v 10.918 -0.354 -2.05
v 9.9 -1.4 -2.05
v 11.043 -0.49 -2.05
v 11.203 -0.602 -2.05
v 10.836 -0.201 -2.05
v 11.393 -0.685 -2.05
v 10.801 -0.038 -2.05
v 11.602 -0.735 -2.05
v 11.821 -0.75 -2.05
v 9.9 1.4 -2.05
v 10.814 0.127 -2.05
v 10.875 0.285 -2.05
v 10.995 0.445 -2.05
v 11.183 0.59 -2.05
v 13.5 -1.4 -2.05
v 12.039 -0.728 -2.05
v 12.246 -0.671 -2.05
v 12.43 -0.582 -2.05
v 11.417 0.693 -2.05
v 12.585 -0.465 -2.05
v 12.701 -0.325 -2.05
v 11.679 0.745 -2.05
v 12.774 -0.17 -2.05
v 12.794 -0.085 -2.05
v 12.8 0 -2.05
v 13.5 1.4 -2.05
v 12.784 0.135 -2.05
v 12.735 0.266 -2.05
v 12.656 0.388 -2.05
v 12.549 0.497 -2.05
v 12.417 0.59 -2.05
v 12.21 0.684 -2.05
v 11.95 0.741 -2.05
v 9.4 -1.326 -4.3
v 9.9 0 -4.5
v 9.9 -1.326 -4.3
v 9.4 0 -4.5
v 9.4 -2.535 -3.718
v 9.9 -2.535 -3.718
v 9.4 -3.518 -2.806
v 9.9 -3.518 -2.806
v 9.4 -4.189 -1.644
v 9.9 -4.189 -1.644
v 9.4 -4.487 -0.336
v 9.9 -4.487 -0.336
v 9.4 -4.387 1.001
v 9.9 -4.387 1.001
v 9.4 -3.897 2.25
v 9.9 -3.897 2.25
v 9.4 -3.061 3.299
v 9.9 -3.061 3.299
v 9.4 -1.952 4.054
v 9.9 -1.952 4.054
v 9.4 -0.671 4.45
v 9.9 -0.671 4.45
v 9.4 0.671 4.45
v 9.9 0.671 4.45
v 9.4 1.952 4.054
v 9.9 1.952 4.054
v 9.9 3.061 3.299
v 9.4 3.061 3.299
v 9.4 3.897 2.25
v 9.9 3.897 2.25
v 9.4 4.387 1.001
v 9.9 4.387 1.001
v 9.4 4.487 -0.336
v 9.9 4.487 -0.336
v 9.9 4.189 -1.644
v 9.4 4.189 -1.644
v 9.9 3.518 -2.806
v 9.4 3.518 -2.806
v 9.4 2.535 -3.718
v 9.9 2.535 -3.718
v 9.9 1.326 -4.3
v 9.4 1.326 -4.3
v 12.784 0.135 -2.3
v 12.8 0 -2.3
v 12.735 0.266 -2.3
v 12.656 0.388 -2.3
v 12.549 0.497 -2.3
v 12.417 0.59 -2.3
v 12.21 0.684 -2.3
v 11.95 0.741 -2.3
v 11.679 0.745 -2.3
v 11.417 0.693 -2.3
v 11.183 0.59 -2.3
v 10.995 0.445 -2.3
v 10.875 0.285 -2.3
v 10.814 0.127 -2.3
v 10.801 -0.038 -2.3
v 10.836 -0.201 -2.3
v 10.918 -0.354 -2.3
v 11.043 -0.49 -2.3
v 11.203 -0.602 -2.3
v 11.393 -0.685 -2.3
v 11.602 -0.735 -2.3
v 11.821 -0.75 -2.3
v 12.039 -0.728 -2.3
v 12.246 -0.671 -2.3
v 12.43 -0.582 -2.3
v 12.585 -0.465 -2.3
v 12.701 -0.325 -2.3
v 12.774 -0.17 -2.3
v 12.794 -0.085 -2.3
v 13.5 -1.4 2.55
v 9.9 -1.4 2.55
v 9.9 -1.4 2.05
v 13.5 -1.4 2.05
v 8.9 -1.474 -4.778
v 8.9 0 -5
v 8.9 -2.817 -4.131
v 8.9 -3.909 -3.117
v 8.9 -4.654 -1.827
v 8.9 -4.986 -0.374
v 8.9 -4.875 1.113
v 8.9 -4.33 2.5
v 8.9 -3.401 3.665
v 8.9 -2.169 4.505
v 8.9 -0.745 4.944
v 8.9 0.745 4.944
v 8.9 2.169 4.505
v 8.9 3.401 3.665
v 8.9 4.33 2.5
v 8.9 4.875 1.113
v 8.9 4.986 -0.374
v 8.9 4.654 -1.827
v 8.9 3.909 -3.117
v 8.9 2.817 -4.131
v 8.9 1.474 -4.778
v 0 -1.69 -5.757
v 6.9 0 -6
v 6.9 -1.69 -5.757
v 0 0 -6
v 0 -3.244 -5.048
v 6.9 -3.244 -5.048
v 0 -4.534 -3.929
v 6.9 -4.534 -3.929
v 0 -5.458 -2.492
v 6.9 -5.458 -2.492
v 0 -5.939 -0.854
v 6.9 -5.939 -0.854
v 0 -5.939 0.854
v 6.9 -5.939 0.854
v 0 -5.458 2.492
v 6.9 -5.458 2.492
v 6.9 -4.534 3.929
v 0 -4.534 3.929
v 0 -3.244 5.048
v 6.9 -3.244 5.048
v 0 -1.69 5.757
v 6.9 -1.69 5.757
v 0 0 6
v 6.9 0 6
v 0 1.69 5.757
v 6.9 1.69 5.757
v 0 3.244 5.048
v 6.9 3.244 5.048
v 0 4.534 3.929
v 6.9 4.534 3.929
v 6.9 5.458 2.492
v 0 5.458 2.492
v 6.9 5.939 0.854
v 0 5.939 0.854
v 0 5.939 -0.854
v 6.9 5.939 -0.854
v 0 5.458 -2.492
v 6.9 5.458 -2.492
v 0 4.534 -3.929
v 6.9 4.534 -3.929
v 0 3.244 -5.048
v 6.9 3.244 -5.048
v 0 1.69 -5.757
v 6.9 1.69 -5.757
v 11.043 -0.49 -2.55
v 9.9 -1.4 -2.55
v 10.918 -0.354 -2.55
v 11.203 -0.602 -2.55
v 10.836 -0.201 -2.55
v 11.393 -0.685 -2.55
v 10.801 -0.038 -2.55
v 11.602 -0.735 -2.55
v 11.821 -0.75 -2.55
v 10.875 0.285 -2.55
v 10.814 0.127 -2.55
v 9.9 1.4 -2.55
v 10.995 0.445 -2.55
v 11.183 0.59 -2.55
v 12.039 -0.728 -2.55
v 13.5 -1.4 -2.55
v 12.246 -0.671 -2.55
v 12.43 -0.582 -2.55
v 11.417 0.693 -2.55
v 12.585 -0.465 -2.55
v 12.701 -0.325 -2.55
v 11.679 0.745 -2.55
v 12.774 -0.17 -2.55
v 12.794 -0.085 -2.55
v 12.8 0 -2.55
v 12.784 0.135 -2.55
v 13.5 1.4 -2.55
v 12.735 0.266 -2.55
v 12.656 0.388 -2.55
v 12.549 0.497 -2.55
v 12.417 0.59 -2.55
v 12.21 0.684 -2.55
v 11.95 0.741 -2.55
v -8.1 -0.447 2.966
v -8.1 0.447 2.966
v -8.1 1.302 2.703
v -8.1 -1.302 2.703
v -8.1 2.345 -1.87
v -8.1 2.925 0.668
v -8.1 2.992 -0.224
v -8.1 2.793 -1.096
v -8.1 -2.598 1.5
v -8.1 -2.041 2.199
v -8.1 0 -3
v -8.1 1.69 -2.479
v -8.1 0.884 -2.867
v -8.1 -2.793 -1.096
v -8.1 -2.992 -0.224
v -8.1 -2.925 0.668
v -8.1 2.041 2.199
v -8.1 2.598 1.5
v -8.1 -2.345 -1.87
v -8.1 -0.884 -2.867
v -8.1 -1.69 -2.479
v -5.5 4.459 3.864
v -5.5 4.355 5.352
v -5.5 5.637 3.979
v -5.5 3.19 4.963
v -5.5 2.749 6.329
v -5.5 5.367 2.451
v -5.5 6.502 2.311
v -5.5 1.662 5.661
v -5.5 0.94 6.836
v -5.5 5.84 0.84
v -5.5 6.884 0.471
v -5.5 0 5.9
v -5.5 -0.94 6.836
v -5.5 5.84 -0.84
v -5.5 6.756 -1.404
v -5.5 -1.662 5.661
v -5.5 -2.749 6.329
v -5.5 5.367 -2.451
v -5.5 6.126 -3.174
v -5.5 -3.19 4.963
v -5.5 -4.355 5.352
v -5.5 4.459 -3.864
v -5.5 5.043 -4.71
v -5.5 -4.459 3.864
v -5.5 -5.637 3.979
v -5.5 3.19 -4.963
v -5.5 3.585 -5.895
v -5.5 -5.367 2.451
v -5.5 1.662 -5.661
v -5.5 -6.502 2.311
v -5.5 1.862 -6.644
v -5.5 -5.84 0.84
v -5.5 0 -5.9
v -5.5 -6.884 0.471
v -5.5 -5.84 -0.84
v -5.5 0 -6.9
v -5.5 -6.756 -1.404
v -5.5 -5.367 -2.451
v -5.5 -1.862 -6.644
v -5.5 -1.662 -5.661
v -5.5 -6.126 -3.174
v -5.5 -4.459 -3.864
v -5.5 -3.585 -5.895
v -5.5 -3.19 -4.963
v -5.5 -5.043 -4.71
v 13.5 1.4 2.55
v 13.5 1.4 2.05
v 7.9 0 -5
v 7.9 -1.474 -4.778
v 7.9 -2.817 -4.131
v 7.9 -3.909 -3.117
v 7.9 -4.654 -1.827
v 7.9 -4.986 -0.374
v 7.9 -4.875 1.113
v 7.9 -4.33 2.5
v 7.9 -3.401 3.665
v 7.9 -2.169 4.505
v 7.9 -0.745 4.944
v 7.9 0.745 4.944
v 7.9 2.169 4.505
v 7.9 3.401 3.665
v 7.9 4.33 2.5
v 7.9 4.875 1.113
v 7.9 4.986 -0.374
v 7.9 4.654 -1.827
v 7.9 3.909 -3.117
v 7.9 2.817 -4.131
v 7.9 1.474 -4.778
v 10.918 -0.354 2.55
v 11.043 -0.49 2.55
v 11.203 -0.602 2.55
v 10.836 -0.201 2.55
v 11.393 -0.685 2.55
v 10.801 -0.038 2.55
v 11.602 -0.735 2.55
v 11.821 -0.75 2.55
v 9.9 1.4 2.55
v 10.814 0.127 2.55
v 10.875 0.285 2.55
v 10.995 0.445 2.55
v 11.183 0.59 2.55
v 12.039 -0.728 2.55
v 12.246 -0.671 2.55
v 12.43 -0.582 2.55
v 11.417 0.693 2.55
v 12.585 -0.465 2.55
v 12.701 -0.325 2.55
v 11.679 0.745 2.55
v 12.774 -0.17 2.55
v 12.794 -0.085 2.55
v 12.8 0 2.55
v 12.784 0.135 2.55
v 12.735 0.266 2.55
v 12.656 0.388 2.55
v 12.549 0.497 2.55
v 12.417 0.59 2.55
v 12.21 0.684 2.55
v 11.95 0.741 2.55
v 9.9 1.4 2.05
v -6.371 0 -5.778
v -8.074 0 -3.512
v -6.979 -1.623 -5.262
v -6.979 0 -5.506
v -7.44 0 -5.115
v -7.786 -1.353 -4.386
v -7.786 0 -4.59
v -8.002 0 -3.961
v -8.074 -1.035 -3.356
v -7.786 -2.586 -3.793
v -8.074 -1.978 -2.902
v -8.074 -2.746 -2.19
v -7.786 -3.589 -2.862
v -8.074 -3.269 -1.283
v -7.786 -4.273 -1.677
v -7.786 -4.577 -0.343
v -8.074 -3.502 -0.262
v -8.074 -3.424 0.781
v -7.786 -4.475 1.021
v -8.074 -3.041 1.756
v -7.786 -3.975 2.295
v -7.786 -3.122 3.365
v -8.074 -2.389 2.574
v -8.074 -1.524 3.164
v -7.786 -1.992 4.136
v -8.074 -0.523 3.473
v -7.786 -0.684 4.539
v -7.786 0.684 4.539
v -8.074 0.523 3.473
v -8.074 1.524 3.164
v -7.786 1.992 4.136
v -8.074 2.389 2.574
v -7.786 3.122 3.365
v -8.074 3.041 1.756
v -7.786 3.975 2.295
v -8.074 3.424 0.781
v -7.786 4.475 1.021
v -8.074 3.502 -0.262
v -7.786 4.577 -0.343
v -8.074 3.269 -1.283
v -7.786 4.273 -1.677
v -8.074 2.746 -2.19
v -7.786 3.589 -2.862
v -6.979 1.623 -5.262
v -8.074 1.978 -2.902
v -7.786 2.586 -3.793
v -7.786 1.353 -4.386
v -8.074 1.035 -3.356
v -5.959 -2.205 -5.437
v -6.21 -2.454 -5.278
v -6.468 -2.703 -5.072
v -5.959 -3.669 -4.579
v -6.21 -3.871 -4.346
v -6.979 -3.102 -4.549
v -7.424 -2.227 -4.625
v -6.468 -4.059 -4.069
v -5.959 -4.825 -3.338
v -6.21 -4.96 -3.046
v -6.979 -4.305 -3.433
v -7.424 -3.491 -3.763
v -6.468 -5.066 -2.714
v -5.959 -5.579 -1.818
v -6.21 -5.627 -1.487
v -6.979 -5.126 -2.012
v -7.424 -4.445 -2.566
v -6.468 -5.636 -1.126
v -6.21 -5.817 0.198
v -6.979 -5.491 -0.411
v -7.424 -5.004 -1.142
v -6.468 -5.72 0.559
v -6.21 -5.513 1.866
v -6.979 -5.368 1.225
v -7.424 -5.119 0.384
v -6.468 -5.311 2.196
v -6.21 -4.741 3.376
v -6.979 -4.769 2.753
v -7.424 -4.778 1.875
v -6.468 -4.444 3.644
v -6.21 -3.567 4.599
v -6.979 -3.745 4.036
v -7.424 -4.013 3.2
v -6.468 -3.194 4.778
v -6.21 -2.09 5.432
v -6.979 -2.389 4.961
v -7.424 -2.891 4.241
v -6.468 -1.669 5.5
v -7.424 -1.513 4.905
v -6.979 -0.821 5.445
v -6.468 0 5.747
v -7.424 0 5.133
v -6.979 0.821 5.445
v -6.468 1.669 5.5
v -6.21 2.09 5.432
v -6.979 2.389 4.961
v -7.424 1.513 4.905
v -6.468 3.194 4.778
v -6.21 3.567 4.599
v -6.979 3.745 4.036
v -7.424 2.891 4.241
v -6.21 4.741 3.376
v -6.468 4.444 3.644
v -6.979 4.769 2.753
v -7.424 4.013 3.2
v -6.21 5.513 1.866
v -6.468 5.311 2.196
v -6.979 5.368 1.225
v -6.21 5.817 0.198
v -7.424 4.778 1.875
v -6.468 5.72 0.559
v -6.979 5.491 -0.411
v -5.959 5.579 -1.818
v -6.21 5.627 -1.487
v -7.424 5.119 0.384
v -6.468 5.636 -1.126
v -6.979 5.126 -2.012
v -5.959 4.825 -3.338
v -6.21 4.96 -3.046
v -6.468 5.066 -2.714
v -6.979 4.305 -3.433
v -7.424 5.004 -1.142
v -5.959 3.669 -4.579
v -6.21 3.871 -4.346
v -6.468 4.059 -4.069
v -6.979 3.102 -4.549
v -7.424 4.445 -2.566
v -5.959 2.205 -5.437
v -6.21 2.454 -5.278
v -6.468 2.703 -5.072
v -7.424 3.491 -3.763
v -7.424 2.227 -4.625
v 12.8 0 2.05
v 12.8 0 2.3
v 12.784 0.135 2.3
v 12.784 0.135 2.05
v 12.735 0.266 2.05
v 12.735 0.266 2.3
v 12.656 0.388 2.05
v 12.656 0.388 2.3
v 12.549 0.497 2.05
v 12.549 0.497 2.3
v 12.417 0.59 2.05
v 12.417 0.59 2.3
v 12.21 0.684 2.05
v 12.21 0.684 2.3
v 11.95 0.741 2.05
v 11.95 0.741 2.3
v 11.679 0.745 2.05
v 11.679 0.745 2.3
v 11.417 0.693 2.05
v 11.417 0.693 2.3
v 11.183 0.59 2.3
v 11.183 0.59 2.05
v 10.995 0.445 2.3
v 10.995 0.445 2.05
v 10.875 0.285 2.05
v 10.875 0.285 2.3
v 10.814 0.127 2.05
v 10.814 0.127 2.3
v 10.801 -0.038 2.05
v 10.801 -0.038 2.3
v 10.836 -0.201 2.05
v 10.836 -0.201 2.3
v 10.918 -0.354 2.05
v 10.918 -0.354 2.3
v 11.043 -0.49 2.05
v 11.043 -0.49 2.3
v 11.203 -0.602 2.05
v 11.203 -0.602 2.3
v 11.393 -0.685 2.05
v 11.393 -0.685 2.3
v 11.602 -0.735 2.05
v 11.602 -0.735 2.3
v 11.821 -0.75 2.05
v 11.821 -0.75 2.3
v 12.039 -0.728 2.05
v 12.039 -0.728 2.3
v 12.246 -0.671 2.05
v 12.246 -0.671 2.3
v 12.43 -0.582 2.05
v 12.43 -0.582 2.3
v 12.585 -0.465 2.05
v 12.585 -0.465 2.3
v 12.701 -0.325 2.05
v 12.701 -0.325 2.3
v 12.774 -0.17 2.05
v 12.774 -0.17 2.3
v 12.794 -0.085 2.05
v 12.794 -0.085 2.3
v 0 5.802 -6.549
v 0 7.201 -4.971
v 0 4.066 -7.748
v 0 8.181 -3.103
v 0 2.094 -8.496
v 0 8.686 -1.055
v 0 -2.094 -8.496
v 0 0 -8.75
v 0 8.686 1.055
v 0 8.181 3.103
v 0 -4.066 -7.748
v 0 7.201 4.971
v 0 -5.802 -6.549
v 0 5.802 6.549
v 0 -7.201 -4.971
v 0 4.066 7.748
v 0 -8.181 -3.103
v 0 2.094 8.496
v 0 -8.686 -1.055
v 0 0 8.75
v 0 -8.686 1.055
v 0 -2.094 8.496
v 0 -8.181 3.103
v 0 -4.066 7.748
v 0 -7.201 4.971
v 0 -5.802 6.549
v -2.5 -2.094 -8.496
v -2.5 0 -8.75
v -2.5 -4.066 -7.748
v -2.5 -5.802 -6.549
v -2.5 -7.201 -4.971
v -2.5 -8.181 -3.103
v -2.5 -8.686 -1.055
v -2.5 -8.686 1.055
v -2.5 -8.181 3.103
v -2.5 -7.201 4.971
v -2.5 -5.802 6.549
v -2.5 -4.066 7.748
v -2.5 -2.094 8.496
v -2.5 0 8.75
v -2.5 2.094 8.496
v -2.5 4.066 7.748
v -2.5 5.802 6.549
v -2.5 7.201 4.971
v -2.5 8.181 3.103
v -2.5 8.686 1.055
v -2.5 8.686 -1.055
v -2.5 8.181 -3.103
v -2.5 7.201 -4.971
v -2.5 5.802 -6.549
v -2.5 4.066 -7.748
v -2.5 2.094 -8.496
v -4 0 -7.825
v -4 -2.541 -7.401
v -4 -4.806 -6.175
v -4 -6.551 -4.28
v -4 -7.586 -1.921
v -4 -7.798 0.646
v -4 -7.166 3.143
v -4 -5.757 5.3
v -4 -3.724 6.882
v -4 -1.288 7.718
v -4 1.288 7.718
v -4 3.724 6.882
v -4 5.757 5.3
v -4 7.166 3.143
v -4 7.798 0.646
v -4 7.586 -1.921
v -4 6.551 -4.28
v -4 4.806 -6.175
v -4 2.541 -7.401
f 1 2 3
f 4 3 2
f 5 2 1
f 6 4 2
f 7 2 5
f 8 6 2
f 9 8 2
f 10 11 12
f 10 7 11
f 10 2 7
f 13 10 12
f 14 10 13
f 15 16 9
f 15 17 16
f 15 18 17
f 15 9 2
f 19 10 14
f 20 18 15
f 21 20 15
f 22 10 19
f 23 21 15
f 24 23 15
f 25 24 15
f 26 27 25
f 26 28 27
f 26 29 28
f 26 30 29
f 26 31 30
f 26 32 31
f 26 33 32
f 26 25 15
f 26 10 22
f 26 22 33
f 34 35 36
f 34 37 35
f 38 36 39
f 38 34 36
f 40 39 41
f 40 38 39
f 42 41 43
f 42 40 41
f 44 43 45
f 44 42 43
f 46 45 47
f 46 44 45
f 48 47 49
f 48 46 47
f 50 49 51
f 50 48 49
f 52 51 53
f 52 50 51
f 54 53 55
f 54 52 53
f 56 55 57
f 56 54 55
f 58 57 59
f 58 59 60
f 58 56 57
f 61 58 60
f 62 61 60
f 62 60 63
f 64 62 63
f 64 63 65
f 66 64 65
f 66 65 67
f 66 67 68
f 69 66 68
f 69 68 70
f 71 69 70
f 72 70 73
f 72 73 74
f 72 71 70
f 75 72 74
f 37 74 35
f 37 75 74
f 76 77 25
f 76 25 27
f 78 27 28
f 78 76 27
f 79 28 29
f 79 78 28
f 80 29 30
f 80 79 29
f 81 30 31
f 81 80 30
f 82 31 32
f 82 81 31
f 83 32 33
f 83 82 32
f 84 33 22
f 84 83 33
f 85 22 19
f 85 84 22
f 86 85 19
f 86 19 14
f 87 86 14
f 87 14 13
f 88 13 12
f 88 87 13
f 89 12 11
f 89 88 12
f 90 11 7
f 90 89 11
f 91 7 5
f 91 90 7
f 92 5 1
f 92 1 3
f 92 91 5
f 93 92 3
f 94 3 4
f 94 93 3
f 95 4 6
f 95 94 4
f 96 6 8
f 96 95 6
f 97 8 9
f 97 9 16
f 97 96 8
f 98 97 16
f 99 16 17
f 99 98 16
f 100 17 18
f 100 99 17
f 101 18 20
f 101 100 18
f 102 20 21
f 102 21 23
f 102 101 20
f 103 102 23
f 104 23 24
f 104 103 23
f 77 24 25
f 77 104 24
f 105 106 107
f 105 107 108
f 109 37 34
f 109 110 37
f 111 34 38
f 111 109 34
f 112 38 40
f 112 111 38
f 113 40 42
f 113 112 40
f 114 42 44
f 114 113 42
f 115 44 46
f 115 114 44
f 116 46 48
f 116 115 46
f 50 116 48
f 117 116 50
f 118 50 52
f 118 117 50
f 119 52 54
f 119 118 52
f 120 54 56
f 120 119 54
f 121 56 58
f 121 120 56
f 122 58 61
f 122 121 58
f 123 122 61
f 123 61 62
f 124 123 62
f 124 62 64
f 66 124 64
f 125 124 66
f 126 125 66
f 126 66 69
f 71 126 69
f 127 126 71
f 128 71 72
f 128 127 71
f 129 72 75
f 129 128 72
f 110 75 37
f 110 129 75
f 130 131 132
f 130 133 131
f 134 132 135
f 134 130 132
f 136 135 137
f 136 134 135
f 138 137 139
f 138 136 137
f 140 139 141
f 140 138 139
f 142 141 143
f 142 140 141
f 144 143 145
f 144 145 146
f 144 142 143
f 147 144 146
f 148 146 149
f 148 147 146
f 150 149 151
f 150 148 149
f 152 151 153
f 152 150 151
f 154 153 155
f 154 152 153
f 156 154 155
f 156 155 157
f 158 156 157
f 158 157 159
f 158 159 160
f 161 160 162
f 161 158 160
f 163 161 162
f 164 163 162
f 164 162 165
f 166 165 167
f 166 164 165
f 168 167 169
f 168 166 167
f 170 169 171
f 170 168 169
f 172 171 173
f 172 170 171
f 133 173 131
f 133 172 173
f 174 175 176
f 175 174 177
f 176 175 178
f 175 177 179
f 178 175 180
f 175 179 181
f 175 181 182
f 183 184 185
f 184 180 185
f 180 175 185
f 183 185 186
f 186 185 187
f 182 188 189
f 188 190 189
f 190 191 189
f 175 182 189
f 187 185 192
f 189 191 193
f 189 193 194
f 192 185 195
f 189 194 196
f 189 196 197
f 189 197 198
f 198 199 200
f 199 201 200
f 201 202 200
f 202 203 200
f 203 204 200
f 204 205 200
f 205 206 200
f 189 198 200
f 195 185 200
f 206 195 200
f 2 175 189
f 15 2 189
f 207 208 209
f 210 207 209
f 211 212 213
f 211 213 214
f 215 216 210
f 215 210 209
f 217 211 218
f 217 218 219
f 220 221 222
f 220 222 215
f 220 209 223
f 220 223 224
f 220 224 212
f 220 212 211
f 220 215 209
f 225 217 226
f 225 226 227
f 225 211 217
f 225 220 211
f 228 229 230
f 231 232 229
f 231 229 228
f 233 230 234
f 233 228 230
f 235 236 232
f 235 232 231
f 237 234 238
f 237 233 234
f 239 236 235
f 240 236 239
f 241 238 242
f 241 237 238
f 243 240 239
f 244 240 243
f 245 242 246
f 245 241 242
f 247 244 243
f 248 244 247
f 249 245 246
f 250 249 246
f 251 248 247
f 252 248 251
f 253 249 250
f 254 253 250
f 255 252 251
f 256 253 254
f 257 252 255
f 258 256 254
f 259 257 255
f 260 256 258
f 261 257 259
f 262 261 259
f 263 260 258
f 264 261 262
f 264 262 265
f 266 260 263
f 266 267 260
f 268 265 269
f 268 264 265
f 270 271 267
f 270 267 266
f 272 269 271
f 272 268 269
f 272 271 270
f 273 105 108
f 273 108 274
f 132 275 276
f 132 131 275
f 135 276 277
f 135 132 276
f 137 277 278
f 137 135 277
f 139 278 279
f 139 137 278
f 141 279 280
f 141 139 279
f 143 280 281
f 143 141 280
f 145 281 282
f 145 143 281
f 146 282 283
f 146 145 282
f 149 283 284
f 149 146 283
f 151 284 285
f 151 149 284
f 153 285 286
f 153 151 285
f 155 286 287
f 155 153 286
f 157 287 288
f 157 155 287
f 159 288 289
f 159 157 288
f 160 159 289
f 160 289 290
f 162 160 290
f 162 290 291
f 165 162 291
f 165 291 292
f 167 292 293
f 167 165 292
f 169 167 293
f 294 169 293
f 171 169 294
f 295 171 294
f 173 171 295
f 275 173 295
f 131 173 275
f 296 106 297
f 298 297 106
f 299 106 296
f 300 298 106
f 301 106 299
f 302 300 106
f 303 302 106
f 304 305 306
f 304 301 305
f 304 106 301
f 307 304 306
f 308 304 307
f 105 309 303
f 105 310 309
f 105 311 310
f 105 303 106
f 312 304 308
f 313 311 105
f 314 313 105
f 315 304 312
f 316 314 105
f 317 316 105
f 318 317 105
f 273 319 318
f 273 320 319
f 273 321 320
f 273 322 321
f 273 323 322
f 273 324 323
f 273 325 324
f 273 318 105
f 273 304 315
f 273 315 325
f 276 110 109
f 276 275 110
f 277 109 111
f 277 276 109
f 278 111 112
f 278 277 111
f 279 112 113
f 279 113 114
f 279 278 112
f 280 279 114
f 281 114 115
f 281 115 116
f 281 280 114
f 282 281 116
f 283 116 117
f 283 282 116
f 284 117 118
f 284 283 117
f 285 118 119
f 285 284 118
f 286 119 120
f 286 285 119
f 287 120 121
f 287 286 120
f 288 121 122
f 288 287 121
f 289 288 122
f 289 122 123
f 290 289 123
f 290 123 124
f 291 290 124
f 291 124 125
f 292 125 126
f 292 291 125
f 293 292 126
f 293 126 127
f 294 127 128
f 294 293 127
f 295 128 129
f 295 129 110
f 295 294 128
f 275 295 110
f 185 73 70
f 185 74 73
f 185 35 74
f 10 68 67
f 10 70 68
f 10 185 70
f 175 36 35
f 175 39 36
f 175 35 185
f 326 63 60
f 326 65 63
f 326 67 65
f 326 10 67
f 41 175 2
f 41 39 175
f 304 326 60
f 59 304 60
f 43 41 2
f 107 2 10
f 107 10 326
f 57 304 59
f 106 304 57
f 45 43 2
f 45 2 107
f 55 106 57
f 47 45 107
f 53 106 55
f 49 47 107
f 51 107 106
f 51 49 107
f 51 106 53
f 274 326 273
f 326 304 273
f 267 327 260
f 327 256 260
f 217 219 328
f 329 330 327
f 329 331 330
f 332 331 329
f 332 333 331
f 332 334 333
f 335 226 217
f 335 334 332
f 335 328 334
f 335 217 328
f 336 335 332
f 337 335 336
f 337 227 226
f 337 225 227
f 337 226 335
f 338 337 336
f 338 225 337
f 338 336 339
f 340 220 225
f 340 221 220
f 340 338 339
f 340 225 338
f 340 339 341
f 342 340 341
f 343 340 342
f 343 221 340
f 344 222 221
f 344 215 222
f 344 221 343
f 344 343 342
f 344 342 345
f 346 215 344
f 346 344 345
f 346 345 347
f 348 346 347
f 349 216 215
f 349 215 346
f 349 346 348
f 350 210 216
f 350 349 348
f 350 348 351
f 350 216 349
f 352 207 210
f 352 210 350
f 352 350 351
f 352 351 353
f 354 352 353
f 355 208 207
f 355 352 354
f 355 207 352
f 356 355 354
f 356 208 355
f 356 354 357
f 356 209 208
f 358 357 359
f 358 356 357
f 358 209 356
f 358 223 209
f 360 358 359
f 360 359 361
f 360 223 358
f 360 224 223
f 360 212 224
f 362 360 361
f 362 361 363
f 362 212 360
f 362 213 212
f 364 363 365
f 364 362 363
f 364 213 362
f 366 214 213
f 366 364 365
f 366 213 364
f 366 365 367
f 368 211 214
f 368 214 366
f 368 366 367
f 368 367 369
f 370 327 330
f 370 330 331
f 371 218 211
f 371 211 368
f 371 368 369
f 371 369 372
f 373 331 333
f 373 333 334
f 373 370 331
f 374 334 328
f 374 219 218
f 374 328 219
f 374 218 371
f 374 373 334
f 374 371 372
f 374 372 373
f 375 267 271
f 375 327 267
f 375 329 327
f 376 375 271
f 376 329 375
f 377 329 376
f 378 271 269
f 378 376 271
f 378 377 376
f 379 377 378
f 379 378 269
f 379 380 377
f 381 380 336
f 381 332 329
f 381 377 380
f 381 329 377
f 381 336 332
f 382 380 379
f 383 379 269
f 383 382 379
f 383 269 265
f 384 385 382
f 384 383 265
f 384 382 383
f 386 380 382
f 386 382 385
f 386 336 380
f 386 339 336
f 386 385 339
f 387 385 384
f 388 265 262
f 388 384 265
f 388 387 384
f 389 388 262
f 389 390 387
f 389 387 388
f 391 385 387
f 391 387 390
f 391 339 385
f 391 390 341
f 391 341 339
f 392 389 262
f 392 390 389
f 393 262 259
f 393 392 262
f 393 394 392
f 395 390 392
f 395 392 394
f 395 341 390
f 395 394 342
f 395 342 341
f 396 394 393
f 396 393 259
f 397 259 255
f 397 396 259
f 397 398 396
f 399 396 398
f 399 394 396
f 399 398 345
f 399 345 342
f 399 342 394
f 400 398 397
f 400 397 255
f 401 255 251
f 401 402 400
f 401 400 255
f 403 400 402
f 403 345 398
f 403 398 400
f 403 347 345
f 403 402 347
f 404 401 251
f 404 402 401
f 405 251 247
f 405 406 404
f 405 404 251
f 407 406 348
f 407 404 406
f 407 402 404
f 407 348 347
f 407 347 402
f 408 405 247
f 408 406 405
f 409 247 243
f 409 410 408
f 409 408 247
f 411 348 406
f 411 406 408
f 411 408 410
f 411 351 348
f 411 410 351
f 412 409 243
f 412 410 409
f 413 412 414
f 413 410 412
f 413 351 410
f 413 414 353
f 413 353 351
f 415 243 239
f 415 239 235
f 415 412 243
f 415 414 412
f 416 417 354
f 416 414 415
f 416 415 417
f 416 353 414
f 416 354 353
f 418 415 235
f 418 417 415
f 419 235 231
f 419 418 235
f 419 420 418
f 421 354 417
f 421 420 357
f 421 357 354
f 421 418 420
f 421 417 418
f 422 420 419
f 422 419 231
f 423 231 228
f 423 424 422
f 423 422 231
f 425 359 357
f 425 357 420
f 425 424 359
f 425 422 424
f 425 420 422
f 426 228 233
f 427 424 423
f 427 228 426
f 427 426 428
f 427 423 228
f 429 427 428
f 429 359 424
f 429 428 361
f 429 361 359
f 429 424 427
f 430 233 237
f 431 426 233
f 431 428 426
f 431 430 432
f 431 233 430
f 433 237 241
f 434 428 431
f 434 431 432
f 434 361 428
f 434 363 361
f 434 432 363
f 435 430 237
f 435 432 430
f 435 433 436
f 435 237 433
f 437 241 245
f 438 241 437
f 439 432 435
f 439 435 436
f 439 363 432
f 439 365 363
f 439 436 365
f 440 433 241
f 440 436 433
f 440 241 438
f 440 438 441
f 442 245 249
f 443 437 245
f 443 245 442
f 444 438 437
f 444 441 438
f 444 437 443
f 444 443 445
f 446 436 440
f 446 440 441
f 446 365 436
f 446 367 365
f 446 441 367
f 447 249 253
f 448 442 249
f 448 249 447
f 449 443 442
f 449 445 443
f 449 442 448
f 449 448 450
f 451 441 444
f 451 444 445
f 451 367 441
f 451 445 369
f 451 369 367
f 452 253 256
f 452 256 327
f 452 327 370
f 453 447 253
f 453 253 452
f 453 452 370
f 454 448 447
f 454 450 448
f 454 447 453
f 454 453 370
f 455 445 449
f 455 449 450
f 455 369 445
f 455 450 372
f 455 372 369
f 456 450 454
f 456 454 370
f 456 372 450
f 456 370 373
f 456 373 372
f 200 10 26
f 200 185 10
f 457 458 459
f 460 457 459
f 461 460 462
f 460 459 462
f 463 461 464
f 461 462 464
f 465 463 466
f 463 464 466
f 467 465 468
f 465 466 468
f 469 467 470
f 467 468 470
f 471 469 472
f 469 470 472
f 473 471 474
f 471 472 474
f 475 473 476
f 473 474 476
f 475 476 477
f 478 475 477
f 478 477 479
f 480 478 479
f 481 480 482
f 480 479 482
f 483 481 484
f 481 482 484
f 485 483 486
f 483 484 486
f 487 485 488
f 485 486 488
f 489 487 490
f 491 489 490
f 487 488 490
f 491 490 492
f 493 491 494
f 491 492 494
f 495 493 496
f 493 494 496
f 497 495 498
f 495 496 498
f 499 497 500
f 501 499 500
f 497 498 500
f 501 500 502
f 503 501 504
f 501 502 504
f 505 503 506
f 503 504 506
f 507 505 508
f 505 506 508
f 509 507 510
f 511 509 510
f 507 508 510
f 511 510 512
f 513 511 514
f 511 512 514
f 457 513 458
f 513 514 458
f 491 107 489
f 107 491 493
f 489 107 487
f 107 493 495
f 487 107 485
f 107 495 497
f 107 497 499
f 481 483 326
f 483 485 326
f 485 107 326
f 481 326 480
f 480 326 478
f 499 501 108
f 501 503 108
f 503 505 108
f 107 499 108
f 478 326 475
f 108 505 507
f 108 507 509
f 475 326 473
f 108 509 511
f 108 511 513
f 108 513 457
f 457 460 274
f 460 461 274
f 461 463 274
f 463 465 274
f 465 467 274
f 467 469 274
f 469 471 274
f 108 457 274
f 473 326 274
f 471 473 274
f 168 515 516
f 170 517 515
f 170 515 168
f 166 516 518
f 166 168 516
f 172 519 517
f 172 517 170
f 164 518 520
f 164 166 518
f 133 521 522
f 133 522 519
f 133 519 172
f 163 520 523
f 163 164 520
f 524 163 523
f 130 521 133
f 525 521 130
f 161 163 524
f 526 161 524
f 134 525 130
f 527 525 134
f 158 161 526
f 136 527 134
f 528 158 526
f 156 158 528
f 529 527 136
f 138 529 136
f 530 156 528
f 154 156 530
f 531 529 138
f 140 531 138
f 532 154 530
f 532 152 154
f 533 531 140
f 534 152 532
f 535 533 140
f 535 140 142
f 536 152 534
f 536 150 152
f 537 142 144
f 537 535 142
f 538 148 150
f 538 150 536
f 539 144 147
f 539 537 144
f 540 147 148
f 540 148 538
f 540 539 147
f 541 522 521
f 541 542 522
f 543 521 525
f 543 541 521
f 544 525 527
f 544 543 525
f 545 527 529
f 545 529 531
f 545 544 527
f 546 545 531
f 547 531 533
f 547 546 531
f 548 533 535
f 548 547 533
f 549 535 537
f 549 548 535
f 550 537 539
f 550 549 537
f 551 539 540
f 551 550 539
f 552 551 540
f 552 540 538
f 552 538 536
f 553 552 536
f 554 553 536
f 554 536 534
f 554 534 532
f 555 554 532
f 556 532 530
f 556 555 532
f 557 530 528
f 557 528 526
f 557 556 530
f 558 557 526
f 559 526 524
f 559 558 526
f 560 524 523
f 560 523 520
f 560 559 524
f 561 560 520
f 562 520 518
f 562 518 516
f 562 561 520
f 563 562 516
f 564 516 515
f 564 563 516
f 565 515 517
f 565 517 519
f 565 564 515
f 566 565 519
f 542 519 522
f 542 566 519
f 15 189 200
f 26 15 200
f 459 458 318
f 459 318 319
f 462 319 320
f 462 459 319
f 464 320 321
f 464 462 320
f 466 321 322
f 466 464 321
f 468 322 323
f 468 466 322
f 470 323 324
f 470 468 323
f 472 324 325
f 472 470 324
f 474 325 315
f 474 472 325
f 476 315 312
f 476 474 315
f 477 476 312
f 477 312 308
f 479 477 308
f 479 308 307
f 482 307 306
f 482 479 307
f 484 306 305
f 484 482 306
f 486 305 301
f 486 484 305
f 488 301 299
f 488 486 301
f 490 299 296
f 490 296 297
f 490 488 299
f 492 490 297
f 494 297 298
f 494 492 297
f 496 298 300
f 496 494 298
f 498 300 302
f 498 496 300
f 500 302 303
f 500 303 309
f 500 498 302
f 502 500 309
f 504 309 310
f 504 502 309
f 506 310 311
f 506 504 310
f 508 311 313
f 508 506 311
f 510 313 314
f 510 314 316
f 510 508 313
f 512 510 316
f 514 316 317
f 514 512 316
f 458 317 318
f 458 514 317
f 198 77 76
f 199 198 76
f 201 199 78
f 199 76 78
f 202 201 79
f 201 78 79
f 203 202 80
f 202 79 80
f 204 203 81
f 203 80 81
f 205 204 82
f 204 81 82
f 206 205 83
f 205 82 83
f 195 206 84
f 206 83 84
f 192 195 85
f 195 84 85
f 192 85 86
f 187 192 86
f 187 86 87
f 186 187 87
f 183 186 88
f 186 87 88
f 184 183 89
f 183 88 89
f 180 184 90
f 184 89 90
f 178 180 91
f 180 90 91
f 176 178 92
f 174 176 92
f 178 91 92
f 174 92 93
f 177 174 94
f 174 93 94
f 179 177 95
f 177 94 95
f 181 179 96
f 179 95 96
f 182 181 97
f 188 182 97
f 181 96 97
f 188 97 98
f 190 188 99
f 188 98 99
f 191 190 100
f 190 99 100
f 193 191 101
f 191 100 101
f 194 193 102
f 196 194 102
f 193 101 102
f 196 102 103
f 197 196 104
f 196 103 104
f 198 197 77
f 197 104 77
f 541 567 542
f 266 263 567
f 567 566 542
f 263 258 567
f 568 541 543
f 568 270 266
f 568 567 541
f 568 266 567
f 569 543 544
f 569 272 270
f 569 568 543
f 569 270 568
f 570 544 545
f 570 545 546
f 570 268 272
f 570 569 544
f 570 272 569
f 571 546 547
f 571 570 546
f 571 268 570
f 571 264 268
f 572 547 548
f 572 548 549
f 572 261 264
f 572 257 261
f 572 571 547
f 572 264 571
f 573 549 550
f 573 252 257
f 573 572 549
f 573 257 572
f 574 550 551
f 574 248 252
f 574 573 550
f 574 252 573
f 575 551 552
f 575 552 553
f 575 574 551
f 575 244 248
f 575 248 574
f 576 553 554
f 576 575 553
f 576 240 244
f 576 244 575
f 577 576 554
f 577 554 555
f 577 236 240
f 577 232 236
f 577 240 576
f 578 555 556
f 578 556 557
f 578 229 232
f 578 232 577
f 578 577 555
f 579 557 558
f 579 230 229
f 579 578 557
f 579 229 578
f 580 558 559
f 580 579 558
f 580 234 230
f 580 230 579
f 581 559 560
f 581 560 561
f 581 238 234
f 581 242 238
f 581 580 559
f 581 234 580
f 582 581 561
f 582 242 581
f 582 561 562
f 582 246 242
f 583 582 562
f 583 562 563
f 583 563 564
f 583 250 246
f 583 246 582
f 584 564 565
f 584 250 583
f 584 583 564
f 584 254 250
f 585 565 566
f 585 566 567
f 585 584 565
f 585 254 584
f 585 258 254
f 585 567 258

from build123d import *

# Parameters (mm, degrees)
SKETCH3_W           = 3.6
SKETCH3_H           = 2.8
SKETCH3_RX          = 1
SKETCH3_RY          = 0.75
BOSS_EXTRUDE1_DEPTH = 0.25


with BuildPart() as part:
    # Sketch2 → Revolve1 (revolve)
    with BuildSketch(Plane(origin=(0, 0, 0), x_dir=(1, 0, 0), z_dir=(0, 1, 0))):
        with BuildLine():
            Line((0, 8.75), (-2.5, 8.75))
            Line((-2.5, 8.75), (-5.5, 6.9))
            Line((-5.5, 6.9), (-5.5, 5.9))
            add(Edge.make_bspline(
                [(-5.5, 5.9), (-6.436492627, 5.9), (-8.1, 5.494365828), (-8.1, 3)],
                knots=[0, 0, 0, 0, 1, 1, 1, 1], degree=3))
            Line((-8.1, 3), (-8.1, 0))
            Line((-8.1, 0), (0, 0))
            Line((0, 0), (9.9, 0))
            Line((9.9, 0), (9.9, 4.5))
            Line((9.9, 4.5), (9.4, 4.5))
            Line((9.4, 4.5), (8.9, 5))
            Line((8.9, 5), (7.9, 5))
            Line((7.9, 5), (6.9, 6))
            Line((6.9, 6), (0, 6))
            Line((0, 6), (0, 8.75))
        make_face()
    revolve(axis=Axis((0, 0, 0), (-1, 0, 0)))

    # Sketch3 → Boss-Extrude1 (add, symmetric)
    with BuildSketch(Plane.XY.offset(2.3)):
        with Locations((11.7, 0)):
            Rectangle(SKETCH3_W, SKETCH3_H)
        with Locations((11.8, 0)):
            Ellipse(SKETCH3_RX, SKETCH3_RY, mode=Mode.SUBTRACT)
    boss_extrude1 = extrude(amount=BOSS_EXTRUDE1_DEPTH, both=True)

    # Mirror1: Boss-Extrude1 across plane
    add(boss_extrude1.mirror(Plane.XY))


solid = part.part
